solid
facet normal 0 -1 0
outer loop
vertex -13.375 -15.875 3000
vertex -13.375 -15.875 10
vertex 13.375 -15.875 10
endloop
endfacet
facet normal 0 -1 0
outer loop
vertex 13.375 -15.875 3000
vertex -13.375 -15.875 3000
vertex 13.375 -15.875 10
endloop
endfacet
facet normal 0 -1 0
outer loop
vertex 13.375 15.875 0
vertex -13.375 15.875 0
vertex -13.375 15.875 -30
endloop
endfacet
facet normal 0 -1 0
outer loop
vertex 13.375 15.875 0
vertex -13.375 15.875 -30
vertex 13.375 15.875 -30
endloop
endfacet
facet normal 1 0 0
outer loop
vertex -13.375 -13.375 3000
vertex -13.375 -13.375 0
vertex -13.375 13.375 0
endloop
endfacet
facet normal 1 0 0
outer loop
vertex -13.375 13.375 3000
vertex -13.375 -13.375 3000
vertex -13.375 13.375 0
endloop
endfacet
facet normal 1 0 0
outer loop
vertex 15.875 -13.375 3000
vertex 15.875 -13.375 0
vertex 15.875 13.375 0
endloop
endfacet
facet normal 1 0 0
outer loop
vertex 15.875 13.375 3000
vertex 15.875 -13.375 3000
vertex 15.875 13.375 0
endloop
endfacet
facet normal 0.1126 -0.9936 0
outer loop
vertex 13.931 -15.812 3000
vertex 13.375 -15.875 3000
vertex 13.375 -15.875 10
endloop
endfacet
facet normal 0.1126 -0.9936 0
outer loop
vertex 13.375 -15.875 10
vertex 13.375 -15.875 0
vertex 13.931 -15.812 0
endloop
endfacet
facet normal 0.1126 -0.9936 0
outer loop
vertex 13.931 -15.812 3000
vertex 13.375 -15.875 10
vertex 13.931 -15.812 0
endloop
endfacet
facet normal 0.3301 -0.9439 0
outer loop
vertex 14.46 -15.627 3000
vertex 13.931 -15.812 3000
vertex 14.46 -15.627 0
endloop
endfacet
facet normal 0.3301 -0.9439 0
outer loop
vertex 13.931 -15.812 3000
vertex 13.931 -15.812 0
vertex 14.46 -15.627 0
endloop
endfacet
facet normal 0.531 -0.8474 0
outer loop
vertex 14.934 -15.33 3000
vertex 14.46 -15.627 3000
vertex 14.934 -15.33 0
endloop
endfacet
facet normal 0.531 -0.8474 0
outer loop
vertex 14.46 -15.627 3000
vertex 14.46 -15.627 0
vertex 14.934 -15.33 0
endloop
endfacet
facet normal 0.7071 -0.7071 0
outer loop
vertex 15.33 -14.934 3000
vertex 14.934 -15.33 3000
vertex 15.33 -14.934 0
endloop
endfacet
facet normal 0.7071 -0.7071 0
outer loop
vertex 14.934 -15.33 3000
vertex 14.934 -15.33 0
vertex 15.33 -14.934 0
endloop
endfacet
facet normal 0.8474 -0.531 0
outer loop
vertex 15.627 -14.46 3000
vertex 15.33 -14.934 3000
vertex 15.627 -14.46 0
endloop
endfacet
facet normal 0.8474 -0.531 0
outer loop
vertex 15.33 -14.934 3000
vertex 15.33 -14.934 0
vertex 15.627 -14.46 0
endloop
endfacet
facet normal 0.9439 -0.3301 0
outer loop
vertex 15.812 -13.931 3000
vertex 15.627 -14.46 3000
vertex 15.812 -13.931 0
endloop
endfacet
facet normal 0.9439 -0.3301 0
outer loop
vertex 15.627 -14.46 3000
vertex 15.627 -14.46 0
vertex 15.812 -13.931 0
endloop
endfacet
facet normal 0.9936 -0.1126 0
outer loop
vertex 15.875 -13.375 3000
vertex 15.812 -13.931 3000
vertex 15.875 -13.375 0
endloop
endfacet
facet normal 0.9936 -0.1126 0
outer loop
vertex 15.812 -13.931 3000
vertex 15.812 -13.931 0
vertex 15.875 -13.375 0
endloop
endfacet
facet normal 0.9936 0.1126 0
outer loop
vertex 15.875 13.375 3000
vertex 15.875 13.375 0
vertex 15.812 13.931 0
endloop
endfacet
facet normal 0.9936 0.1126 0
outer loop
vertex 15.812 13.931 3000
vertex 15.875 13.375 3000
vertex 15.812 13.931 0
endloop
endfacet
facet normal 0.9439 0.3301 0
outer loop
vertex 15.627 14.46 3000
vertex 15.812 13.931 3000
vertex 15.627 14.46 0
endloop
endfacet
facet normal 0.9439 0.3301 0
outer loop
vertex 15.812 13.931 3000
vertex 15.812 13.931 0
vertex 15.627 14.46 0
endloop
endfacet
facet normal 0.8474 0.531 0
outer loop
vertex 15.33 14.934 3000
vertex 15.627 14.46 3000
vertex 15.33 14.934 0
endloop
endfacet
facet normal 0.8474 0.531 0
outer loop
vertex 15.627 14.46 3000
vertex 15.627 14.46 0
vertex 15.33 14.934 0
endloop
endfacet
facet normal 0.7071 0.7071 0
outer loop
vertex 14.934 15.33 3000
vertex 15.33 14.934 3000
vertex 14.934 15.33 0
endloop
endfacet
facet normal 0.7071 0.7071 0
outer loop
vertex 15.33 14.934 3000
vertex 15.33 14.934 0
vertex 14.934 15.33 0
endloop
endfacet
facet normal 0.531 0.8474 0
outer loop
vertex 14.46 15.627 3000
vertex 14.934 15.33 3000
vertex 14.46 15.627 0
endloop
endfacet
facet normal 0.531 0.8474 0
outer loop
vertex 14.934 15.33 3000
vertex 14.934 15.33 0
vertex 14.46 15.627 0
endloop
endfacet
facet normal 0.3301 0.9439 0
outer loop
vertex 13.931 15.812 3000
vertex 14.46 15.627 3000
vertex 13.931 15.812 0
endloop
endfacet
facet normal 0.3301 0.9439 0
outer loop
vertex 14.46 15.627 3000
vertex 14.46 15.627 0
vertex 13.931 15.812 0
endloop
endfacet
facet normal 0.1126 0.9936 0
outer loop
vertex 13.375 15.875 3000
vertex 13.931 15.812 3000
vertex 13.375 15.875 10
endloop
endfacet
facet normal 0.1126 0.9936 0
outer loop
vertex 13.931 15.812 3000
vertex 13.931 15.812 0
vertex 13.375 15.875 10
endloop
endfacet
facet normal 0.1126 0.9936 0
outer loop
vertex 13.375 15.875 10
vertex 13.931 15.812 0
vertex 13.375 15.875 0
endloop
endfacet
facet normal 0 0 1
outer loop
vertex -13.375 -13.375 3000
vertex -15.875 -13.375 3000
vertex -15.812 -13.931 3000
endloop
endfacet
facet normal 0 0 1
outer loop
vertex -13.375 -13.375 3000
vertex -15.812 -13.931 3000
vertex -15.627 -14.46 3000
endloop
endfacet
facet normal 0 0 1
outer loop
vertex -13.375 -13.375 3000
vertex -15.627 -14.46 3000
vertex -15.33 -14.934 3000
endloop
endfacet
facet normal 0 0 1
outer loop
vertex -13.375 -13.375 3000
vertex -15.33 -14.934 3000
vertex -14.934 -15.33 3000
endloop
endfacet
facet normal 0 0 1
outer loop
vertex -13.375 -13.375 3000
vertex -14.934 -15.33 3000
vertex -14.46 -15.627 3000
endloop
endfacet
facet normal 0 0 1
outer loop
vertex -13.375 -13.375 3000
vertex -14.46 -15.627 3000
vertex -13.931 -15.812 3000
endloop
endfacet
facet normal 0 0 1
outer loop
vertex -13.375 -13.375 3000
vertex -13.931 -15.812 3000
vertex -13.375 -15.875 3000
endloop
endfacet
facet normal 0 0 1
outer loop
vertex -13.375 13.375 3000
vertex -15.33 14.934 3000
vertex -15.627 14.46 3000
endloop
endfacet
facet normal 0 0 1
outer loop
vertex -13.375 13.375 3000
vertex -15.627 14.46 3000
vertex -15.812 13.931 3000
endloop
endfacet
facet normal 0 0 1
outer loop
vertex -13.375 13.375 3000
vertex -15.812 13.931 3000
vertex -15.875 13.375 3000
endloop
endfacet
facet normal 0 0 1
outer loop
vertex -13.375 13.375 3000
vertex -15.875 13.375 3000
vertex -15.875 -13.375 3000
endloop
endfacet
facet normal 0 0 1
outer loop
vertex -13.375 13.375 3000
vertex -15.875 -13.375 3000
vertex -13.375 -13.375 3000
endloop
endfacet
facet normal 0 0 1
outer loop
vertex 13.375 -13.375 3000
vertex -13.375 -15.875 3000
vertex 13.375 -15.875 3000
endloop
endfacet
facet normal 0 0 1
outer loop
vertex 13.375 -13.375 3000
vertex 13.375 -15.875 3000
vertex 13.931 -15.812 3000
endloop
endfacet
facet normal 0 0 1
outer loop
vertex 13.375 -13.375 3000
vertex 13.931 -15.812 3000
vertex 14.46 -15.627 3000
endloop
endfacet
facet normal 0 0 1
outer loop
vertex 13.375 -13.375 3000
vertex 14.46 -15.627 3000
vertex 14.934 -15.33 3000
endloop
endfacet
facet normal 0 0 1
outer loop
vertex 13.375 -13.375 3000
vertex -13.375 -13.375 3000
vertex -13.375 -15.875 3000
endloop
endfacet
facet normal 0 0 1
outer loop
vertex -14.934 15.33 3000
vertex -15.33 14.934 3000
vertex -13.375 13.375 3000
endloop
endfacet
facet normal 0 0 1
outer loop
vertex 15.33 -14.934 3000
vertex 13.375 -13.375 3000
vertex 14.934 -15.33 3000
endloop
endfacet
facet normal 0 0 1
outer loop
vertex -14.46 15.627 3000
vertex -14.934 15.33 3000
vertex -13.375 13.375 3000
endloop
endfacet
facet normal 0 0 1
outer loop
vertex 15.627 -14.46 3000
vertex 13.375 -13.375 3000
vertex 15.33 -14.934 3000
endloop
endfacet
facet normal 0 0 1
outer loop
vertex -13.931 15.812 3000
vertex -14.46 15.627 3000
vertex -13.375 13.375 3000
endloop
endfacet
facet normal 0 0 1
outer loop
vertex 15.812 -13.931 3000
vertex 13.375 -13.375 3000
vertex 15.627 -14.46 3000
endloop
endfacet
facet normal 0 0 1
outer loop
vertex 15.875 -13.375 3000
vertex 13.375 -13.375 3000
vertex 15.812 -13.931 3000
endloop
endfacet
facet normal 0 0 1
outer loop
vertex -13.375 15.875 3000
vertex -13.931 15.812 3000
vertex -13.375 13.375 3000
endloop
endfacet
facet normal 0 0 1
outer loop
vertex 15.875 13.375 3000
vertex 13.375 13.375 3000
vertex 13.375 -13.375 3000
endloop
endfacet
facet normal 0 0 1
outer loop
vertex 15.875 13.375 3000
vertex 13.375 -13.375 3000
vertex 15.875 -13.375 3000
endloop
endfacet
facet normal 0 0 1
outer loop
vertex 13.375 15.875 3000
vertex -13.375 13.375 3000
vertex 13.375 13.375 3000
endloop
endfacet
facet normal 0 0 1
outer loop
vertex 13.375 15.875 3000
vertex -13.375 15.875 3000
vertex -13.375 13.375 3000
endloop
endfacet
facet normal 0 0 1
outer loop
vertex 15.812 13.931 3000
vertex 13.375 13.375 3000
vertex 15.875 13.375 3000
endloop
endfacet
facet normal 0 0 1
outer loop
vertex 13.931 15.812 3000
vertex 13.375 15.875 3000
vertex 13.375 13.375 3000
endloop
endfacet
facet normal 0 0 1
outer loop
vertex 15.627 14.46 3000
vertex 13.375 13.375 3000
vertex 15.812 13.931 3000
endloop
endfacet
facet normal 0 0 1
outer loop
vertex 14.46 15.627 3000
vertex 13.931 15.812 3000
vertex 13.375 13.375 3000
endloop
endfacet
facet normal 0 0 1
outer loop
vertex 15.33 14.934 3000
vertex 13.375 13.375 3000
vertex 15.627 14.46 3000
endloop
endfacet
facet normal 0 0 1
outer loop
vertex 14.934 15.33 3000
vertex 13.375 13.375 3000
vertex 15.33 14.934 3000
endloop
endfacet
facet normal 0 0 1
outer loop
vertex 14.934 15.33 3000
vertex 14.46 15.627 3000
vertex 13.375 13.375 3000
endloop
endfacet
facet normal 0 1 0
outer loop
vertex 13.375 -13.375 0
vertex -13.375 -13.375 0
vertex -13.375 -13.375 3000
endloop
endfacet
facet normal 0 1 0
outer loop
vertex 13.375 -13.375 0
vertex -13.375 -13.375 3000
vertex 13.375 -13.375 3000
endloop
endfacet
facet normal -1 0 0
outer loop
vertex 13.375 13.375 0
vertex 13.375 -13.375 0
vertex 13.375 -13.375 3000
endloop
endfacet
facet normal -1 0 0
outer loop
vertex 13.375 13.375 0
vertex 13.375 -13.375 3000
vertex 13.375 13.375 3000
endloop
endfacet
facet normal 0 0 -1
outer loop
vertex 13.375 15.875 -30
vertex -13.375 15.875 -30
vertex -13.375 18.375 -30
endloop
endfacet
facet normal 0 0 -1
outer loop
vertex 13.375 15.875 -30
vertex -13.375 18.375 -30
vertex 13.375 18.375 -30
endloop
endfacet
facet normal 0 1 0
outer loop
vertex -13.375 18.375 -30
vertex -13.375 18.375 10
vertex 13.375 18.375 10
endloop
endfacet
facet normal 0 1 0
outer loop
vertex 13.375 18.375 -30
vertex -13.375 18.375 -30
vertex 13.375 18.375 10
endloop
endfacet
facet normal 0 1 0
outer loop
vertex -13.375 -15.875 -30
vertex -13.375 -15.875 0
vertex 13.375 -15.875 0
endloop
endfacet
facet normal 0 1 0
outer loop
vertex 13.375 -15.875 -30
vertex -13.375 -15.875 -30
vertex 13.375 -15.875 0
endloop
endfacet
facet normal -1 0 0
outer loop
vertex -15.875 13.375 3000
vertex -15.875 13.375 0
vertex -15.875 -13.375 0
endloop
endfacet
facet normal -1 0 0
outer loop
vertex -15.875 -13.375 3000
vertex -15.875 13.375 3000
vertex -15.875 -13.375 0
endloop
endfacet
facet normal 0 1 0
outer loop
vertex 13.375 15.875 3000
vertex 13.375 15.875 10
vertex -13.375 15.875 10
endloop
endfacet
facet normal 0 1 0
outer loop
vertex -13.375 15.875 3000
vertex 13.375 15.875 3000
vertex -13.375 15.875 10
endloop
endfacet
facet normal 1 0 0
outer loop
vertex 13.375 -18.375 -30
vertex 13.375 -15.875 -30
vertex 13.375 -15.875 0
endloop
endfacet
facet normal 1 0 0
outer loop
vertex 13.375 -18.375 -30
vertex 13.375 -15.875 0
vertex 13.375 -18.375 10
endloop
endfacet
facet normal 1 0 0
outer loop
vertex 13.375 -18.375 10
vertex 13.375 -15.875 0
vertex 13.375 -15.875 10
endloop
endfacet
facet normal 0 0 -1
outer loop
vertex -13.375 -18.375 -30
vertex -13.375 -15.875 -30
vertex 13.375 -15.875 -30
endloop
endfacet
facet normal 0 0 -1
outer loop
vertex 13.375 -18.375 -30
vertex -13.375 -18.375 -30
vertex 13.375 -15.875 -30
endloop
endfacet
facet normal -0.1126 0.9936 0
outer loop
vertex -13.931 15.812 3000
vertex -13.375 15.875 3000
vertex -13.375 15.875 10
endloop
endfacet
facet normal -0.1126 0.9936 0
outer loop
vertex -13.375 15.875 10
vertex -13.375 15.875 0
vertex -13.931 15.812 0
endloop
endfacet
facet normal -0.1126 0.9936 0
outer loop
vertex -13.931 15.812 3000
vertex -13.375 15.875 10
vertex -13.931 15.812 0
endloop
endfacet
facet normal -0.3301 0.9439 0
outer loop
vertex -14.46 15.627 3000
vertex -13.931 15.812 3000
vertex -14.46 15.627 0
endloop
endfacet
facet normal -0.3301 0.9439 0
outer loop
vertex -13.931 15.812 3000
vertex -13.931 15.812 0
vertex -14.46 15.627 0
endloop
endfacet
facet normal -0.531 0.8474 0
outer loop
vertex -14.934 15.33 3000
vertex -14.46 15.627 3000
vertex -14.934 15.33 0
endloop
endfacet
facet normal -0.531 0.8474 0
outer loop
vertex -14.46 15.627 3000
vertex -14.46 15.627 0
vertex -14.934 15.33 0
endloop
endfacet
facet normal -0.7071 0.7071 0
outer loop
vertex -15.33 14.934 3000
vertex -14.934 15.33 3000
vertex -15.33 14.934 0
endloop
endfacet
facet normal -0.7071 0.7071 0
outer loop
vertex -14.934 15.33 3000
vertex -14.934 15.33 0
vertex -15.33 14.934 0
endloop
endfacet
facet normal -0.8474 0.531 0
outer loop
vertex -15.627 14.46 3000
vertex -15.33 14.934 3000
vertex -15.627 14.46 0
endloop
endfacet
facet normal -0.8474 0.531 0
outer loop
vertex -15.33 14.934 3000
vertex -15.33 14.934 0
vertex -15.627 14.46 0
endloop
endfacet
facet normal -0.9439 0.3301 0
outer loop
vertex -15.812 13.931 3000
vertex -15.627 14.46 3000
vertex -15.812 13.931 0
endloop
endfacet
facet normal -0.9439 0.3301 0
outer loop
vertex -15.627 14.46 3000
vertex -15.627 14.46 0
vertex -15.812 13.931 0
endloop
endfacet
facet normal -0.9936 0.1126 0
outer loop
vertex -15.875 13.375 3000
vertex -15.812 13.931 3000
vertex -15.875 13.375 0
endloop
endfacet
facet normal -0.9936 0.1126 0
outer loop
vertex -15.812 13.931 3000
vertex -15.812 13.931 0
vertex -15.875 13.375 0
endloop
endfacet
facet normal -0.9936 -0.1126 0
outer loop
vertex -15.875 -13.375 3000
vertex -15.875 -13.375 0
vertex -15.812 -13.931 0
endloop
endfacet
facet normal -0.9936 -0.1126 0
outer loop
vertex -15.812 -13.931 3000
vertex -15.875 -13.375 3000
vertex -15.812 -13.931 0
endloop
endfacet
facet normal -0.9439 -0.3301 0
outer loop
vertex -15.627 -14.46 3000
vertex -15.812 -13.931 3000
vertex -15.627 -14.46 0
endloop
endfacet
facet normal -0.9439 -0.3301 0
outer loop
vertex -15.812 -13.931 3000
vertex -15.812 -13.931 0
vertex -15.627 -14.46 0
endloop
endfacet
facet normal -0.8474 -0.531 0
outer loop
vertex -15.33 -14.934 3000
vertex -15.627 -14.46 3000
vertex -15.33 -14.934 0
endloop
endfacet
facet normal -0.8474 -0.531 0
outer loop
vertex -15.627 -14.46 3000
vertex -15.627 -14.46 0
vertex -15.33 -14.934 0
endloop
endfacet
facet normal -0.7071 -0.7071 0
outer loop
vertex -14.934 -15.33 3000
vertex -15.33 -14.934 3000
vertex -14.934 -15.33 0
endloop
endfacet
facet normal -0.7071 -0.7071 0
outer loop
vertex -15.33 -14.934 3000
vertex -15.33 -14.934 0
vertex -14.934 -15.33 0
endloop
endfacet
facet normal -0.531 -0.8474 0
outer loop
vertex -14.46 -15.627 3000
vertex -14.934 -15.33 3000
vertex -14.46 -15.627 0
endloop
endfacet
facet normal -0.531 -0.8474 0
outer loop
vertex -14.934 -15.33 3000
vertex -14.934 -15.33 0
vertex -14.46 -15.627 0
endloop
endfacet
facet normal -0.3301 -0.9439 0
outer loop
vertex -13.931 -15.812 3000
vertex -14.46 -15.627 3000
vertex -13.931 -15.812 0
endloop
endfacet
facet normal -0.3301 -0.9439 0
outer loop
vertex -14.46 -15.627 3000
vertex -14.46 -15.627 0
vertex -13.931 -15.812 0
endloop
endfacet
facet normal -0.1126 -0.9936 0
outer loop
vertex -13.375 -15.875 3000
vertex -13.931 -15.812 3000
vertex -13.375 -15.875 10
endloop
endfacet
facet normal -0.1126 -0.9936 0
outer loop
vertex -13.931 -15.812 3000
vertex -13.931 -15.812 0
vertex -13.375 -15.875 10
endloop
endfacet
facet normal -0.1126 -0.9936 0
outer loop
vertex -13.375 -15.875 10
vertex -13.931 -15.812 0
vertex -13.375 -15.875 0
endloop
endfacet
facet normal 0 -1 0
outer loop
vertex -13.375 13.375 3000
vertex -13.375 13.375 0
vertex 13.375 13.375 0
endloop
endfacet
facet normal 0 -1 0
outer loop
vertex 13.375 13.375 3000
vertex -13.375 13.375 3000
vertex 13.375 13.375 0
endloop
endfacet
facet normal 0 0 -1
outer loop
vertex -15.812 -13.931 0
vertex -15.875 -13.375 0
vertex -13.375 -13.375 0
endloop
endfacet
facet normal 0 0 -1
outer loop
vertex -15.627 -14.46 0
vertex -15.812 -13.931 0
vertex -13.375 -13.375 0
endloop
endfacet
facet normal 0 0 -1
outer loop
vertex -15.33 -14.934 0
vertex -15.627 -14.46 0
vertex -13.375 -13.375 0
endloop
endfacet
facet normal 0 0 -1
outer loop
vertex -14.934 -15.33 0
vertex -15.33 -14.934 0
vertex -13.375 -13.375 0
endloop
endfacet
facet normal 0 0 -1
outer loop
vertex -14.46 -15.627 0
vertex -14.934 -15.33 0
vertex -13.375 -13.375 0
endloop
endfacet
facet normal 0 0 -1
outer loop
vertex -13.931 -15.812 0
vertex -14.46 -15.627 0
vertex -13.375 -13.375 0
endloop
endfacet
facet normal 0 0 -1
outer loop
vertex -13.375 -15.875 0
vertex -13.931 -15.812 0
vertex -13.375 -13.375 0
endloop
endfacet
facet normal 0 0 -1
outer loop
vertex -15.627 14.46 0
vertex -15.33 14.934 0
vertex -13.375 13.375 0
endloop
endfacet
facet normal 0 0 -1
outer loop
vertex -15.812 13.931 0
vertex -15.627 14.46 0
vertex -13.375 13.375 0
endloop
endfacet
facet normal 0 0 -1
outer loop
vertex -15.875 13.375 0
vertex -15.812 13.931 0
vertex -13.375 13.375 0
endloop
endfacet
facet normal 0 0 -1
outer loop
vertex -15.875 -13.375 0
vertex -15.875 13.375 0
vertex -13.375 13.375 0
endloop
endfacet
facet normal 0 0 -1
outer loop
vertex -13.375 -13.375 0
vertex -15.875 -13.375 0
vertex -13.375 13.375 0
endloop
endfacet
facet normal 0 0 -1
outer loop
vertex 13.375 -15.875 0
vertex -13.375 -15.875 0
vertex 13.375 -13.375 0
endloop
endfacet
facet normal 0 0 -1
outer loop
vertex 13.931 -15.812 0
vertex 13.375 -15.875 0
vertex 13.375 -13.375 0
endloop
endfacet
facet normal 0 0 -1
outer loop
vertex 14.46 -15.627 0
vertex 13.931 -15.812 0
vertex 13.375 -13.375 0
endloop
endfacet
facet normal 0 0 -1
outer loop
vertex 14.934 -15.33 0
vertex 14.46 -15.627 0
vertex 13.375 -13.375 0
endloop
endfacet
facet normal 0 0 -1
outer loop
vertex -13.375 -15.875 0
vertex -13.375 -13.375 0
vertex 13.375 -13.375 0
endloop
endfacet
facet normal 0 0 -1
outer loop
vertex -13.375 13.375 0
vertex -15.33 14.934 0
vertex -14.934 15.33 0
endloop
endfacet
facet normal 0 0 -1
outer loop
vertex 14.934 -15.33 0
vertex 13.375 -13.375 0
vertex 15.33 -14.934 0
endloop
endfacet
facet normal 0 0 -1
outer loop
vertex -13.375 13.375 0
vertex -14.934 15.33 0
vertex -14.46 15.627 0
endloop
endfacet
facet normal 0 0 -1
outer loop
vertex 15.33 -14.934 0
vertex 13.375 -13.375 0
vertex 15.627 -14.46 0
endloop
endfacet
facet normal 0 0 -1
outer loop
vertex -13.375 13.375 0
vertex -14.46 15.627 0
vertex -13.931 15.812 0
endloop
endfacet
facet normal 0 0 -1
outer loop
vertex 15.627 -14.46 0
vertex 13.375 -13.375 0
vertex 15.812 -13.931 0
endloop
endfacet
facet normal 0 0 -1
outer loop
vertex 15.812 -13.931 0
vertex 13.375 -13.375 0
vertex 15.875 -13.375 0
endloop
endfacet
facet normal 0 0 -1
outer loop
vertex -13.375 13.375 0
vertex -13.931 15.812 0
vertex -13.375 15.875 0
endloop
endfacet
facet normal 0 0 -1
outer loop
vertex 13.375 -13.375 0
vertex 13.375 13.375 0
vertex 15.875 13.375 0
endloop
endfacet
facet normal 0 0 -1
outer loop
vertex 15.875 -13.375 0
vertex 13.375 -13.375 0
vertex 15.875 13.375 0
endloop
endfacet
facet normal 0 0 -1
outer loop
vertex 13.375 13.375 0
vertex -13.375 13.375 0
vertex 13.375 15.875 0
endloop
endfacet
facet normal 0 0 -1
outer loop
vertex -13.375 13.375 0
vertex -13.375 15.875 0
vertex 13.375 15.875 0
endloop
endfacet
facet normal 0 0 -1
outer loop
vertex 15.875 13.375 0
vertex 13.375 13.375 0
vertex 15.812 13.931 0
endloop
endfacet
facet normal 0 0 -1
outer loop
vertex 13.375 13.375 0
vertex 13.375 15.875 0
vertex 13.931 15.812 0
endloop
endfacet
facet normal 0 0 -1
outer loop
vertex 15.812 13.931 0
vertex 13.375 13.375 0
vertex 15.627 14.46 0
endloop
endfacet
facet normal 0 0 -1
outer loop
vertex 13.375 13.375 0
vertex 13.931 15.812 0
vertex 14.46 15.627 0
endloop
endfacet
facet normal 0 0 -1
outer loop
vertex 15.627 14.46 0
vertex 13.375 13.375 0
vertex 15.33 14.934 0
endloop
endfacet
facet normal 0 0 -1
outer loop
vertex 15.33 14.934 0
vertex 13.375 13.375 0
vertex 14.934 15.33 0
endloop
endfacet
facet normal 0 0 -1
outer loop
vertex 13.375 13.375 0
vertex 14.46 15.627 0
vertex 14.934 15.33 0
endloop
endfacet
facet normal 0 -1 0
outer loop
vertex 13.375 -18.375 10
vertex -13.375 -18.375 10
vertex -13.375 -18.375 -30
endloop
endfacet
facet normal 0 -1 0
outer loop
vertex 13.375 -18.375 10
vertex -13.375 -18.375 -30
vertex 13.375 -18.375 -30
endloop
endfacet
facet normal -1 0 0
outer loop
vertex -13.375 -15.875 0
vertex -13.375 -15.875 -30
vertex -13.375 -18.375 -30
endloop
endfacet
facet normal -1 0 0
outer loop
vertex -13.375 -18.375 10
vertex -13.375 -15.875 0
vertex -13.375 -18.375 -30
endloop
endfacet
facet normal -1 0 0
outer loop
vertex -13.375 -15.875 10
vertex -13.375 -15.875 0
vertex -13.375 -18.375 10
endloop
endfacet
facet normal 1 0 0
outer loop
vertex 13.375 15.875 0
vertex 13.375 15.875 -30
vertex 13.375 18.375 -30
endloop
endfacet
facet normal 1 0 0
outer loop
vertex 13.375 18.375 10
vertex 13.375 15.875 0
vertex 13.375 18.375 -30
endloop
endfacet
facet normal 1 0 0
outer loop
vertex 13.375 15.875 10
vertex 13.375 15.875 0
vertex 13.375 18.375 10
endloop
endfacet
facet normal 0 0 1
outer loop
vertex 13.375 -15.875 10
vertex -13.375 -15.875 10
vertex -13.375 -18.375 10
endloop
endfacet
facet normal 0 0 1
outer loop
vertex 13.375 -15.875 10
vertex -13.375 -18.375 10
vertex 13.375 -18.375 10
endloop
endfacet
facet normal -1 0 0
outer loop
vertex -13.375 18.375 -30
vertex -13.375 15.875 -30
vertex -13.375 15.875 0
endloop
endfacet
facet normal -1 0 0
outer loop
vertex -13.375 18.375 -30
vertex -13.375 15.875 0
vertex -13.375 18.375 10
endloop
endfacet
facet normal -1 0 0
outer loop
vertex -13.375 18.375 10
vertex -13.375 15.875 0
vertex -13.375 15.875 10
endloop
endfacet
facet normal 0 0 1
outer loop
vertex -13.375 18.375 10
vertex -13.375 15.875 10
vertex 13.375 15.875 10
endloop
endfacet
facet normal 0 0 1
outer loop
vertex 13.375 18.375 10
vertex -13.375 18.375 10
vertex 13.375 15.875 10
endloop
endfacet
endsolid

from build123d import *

# Parameters (mm, degrees)
F0_W     = 26.75
F0_H     = 26.75
F1_DEPTH = 3000
F2_W     = 26.75
F2_H     = 40
F3_DEPTH = 2.5


with BuildPart() as f1:
    # F0 (on Top) → F1 (new body)
    with BuildSketch(Plane.XY):
        with BuildLine():
            ThreePointArc((15.875, 13.375), (15.142766953, 15.142766953), (13.375, 15.875))
            Line((13.375, 15.875), (-13.375, 15.875))
            ThreePointArc((-13.375, 15.875), (-15.142766953, 15.142766953), (-15.875, 13.375))
            Line((-15.875, 13.375), (-15.875, -13.375))
            ThreePointArc((-15.875, -13.375), (-15.142766953, -15.142766953), (-13.375, -15.875))
            Line((-13.375, -15.875), (13.375, -15.875))
            ThreePointArc((13.375, -15.875), (15.142766953, -15.142766953), (15.875, -13.375))
            Line((15.875, -13.375), (15.875, 13.375))
        make_face()
        Rectangle(F0_W, F0_H, mode=Mode.SUBTRACT)
    extrude(amount=F1_DEPTH)

    # F2 (on face) → F3 (join)
    with BuildSketch(Plane.XZ.offset(15.875)):
        with Locations((0, -10)):
            Rectangle(F2_W, F2_H)
    extrude(amount=F3_DEPTH)

    # F4: F1 across plane


with BuildPart() as f1_1:
    add(f1.part)
    add(f1.part.mirror(Plane.XZ))


solid = f1_1.part
